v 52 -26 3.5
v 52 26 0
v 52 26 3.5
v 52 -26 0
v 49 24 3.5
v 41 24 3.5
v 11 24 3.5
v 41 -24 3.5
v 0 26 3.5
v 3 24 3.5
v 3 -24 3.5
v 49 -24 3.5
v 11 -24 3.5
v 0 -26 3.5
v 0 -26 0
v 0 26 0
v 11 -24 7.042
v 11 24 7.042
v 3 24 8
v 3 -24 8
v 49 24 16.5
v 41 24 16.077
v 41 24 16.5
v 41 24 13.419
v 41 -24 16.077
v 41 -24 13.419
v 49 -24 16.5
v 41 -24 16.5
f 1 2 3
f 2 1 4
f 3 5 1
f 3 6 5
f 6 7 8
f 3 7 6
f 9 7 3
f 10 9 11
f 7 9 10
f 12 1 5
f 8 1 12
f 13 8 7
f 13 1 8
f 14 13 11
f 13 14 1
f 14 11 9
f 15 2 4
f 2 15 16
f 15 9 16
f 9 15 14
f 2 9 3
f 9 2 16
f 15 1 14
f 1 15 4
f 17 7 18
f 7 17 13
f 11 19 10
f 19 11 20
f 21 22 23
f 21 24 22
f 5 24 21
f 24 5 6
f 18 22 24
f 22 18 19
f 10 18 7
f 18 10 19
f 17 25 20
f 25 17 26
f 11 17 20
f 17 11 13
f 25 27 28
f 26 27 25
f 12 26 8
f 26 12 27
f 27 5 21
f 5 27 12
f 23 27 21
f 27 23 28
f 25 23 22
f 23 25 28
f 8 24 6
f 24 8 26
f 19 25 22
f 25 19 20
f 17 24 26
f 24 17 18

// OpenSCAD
//
// timer_bracket.scad
// Bracket for an ASA AirClassics timer Flight Timer-3 aka TIMER-3
//
// Copyright (c) 2024 Pete Zaitcev
//

base_len = 52.0;
base_w = 52.0;
br_w = 48.0;

br_main_th = 2.6;     // The section under clip
// br_stop_th = 4.0;     // Stop strips

// The towers also serve as stops. The distance between them
// corresponds to the size of the clip, 27 mm with a small reserve.
h_north = 8.0;
x_north = 3.0;
th_north = 8.0;
h_south = 16.5;
x_south = 3.0;
th_south = 8.0;

// We design with the back plate down for best adhesion.
module bracket () {

    // Back plate is the backbone of everything.
    // It is large enough for 4 squares of heavy duty tape.
    translate([0, (base_w/2)*-1, 0])
        cube([base_len, base_w, 3.5]);

    // North tower
    translate([x_north, (br_w/2)*-1, 0])
        cube([th_north, br_w, h_north]);

    // South tower
    translate([base_len - x_south - th_south, (br_w/2)*-1, 0])
        cube([th_south, br_w, h_south]);

    // Bracket
    translate([x_north, 0, h_north]) {
        rotate(-12.0, [0,1,0])
            translate([0, (br_w/2)*-1, br_main_th*-1])
                cube([40.0, br_w, br_main_th]);
    }
}

bracket();
